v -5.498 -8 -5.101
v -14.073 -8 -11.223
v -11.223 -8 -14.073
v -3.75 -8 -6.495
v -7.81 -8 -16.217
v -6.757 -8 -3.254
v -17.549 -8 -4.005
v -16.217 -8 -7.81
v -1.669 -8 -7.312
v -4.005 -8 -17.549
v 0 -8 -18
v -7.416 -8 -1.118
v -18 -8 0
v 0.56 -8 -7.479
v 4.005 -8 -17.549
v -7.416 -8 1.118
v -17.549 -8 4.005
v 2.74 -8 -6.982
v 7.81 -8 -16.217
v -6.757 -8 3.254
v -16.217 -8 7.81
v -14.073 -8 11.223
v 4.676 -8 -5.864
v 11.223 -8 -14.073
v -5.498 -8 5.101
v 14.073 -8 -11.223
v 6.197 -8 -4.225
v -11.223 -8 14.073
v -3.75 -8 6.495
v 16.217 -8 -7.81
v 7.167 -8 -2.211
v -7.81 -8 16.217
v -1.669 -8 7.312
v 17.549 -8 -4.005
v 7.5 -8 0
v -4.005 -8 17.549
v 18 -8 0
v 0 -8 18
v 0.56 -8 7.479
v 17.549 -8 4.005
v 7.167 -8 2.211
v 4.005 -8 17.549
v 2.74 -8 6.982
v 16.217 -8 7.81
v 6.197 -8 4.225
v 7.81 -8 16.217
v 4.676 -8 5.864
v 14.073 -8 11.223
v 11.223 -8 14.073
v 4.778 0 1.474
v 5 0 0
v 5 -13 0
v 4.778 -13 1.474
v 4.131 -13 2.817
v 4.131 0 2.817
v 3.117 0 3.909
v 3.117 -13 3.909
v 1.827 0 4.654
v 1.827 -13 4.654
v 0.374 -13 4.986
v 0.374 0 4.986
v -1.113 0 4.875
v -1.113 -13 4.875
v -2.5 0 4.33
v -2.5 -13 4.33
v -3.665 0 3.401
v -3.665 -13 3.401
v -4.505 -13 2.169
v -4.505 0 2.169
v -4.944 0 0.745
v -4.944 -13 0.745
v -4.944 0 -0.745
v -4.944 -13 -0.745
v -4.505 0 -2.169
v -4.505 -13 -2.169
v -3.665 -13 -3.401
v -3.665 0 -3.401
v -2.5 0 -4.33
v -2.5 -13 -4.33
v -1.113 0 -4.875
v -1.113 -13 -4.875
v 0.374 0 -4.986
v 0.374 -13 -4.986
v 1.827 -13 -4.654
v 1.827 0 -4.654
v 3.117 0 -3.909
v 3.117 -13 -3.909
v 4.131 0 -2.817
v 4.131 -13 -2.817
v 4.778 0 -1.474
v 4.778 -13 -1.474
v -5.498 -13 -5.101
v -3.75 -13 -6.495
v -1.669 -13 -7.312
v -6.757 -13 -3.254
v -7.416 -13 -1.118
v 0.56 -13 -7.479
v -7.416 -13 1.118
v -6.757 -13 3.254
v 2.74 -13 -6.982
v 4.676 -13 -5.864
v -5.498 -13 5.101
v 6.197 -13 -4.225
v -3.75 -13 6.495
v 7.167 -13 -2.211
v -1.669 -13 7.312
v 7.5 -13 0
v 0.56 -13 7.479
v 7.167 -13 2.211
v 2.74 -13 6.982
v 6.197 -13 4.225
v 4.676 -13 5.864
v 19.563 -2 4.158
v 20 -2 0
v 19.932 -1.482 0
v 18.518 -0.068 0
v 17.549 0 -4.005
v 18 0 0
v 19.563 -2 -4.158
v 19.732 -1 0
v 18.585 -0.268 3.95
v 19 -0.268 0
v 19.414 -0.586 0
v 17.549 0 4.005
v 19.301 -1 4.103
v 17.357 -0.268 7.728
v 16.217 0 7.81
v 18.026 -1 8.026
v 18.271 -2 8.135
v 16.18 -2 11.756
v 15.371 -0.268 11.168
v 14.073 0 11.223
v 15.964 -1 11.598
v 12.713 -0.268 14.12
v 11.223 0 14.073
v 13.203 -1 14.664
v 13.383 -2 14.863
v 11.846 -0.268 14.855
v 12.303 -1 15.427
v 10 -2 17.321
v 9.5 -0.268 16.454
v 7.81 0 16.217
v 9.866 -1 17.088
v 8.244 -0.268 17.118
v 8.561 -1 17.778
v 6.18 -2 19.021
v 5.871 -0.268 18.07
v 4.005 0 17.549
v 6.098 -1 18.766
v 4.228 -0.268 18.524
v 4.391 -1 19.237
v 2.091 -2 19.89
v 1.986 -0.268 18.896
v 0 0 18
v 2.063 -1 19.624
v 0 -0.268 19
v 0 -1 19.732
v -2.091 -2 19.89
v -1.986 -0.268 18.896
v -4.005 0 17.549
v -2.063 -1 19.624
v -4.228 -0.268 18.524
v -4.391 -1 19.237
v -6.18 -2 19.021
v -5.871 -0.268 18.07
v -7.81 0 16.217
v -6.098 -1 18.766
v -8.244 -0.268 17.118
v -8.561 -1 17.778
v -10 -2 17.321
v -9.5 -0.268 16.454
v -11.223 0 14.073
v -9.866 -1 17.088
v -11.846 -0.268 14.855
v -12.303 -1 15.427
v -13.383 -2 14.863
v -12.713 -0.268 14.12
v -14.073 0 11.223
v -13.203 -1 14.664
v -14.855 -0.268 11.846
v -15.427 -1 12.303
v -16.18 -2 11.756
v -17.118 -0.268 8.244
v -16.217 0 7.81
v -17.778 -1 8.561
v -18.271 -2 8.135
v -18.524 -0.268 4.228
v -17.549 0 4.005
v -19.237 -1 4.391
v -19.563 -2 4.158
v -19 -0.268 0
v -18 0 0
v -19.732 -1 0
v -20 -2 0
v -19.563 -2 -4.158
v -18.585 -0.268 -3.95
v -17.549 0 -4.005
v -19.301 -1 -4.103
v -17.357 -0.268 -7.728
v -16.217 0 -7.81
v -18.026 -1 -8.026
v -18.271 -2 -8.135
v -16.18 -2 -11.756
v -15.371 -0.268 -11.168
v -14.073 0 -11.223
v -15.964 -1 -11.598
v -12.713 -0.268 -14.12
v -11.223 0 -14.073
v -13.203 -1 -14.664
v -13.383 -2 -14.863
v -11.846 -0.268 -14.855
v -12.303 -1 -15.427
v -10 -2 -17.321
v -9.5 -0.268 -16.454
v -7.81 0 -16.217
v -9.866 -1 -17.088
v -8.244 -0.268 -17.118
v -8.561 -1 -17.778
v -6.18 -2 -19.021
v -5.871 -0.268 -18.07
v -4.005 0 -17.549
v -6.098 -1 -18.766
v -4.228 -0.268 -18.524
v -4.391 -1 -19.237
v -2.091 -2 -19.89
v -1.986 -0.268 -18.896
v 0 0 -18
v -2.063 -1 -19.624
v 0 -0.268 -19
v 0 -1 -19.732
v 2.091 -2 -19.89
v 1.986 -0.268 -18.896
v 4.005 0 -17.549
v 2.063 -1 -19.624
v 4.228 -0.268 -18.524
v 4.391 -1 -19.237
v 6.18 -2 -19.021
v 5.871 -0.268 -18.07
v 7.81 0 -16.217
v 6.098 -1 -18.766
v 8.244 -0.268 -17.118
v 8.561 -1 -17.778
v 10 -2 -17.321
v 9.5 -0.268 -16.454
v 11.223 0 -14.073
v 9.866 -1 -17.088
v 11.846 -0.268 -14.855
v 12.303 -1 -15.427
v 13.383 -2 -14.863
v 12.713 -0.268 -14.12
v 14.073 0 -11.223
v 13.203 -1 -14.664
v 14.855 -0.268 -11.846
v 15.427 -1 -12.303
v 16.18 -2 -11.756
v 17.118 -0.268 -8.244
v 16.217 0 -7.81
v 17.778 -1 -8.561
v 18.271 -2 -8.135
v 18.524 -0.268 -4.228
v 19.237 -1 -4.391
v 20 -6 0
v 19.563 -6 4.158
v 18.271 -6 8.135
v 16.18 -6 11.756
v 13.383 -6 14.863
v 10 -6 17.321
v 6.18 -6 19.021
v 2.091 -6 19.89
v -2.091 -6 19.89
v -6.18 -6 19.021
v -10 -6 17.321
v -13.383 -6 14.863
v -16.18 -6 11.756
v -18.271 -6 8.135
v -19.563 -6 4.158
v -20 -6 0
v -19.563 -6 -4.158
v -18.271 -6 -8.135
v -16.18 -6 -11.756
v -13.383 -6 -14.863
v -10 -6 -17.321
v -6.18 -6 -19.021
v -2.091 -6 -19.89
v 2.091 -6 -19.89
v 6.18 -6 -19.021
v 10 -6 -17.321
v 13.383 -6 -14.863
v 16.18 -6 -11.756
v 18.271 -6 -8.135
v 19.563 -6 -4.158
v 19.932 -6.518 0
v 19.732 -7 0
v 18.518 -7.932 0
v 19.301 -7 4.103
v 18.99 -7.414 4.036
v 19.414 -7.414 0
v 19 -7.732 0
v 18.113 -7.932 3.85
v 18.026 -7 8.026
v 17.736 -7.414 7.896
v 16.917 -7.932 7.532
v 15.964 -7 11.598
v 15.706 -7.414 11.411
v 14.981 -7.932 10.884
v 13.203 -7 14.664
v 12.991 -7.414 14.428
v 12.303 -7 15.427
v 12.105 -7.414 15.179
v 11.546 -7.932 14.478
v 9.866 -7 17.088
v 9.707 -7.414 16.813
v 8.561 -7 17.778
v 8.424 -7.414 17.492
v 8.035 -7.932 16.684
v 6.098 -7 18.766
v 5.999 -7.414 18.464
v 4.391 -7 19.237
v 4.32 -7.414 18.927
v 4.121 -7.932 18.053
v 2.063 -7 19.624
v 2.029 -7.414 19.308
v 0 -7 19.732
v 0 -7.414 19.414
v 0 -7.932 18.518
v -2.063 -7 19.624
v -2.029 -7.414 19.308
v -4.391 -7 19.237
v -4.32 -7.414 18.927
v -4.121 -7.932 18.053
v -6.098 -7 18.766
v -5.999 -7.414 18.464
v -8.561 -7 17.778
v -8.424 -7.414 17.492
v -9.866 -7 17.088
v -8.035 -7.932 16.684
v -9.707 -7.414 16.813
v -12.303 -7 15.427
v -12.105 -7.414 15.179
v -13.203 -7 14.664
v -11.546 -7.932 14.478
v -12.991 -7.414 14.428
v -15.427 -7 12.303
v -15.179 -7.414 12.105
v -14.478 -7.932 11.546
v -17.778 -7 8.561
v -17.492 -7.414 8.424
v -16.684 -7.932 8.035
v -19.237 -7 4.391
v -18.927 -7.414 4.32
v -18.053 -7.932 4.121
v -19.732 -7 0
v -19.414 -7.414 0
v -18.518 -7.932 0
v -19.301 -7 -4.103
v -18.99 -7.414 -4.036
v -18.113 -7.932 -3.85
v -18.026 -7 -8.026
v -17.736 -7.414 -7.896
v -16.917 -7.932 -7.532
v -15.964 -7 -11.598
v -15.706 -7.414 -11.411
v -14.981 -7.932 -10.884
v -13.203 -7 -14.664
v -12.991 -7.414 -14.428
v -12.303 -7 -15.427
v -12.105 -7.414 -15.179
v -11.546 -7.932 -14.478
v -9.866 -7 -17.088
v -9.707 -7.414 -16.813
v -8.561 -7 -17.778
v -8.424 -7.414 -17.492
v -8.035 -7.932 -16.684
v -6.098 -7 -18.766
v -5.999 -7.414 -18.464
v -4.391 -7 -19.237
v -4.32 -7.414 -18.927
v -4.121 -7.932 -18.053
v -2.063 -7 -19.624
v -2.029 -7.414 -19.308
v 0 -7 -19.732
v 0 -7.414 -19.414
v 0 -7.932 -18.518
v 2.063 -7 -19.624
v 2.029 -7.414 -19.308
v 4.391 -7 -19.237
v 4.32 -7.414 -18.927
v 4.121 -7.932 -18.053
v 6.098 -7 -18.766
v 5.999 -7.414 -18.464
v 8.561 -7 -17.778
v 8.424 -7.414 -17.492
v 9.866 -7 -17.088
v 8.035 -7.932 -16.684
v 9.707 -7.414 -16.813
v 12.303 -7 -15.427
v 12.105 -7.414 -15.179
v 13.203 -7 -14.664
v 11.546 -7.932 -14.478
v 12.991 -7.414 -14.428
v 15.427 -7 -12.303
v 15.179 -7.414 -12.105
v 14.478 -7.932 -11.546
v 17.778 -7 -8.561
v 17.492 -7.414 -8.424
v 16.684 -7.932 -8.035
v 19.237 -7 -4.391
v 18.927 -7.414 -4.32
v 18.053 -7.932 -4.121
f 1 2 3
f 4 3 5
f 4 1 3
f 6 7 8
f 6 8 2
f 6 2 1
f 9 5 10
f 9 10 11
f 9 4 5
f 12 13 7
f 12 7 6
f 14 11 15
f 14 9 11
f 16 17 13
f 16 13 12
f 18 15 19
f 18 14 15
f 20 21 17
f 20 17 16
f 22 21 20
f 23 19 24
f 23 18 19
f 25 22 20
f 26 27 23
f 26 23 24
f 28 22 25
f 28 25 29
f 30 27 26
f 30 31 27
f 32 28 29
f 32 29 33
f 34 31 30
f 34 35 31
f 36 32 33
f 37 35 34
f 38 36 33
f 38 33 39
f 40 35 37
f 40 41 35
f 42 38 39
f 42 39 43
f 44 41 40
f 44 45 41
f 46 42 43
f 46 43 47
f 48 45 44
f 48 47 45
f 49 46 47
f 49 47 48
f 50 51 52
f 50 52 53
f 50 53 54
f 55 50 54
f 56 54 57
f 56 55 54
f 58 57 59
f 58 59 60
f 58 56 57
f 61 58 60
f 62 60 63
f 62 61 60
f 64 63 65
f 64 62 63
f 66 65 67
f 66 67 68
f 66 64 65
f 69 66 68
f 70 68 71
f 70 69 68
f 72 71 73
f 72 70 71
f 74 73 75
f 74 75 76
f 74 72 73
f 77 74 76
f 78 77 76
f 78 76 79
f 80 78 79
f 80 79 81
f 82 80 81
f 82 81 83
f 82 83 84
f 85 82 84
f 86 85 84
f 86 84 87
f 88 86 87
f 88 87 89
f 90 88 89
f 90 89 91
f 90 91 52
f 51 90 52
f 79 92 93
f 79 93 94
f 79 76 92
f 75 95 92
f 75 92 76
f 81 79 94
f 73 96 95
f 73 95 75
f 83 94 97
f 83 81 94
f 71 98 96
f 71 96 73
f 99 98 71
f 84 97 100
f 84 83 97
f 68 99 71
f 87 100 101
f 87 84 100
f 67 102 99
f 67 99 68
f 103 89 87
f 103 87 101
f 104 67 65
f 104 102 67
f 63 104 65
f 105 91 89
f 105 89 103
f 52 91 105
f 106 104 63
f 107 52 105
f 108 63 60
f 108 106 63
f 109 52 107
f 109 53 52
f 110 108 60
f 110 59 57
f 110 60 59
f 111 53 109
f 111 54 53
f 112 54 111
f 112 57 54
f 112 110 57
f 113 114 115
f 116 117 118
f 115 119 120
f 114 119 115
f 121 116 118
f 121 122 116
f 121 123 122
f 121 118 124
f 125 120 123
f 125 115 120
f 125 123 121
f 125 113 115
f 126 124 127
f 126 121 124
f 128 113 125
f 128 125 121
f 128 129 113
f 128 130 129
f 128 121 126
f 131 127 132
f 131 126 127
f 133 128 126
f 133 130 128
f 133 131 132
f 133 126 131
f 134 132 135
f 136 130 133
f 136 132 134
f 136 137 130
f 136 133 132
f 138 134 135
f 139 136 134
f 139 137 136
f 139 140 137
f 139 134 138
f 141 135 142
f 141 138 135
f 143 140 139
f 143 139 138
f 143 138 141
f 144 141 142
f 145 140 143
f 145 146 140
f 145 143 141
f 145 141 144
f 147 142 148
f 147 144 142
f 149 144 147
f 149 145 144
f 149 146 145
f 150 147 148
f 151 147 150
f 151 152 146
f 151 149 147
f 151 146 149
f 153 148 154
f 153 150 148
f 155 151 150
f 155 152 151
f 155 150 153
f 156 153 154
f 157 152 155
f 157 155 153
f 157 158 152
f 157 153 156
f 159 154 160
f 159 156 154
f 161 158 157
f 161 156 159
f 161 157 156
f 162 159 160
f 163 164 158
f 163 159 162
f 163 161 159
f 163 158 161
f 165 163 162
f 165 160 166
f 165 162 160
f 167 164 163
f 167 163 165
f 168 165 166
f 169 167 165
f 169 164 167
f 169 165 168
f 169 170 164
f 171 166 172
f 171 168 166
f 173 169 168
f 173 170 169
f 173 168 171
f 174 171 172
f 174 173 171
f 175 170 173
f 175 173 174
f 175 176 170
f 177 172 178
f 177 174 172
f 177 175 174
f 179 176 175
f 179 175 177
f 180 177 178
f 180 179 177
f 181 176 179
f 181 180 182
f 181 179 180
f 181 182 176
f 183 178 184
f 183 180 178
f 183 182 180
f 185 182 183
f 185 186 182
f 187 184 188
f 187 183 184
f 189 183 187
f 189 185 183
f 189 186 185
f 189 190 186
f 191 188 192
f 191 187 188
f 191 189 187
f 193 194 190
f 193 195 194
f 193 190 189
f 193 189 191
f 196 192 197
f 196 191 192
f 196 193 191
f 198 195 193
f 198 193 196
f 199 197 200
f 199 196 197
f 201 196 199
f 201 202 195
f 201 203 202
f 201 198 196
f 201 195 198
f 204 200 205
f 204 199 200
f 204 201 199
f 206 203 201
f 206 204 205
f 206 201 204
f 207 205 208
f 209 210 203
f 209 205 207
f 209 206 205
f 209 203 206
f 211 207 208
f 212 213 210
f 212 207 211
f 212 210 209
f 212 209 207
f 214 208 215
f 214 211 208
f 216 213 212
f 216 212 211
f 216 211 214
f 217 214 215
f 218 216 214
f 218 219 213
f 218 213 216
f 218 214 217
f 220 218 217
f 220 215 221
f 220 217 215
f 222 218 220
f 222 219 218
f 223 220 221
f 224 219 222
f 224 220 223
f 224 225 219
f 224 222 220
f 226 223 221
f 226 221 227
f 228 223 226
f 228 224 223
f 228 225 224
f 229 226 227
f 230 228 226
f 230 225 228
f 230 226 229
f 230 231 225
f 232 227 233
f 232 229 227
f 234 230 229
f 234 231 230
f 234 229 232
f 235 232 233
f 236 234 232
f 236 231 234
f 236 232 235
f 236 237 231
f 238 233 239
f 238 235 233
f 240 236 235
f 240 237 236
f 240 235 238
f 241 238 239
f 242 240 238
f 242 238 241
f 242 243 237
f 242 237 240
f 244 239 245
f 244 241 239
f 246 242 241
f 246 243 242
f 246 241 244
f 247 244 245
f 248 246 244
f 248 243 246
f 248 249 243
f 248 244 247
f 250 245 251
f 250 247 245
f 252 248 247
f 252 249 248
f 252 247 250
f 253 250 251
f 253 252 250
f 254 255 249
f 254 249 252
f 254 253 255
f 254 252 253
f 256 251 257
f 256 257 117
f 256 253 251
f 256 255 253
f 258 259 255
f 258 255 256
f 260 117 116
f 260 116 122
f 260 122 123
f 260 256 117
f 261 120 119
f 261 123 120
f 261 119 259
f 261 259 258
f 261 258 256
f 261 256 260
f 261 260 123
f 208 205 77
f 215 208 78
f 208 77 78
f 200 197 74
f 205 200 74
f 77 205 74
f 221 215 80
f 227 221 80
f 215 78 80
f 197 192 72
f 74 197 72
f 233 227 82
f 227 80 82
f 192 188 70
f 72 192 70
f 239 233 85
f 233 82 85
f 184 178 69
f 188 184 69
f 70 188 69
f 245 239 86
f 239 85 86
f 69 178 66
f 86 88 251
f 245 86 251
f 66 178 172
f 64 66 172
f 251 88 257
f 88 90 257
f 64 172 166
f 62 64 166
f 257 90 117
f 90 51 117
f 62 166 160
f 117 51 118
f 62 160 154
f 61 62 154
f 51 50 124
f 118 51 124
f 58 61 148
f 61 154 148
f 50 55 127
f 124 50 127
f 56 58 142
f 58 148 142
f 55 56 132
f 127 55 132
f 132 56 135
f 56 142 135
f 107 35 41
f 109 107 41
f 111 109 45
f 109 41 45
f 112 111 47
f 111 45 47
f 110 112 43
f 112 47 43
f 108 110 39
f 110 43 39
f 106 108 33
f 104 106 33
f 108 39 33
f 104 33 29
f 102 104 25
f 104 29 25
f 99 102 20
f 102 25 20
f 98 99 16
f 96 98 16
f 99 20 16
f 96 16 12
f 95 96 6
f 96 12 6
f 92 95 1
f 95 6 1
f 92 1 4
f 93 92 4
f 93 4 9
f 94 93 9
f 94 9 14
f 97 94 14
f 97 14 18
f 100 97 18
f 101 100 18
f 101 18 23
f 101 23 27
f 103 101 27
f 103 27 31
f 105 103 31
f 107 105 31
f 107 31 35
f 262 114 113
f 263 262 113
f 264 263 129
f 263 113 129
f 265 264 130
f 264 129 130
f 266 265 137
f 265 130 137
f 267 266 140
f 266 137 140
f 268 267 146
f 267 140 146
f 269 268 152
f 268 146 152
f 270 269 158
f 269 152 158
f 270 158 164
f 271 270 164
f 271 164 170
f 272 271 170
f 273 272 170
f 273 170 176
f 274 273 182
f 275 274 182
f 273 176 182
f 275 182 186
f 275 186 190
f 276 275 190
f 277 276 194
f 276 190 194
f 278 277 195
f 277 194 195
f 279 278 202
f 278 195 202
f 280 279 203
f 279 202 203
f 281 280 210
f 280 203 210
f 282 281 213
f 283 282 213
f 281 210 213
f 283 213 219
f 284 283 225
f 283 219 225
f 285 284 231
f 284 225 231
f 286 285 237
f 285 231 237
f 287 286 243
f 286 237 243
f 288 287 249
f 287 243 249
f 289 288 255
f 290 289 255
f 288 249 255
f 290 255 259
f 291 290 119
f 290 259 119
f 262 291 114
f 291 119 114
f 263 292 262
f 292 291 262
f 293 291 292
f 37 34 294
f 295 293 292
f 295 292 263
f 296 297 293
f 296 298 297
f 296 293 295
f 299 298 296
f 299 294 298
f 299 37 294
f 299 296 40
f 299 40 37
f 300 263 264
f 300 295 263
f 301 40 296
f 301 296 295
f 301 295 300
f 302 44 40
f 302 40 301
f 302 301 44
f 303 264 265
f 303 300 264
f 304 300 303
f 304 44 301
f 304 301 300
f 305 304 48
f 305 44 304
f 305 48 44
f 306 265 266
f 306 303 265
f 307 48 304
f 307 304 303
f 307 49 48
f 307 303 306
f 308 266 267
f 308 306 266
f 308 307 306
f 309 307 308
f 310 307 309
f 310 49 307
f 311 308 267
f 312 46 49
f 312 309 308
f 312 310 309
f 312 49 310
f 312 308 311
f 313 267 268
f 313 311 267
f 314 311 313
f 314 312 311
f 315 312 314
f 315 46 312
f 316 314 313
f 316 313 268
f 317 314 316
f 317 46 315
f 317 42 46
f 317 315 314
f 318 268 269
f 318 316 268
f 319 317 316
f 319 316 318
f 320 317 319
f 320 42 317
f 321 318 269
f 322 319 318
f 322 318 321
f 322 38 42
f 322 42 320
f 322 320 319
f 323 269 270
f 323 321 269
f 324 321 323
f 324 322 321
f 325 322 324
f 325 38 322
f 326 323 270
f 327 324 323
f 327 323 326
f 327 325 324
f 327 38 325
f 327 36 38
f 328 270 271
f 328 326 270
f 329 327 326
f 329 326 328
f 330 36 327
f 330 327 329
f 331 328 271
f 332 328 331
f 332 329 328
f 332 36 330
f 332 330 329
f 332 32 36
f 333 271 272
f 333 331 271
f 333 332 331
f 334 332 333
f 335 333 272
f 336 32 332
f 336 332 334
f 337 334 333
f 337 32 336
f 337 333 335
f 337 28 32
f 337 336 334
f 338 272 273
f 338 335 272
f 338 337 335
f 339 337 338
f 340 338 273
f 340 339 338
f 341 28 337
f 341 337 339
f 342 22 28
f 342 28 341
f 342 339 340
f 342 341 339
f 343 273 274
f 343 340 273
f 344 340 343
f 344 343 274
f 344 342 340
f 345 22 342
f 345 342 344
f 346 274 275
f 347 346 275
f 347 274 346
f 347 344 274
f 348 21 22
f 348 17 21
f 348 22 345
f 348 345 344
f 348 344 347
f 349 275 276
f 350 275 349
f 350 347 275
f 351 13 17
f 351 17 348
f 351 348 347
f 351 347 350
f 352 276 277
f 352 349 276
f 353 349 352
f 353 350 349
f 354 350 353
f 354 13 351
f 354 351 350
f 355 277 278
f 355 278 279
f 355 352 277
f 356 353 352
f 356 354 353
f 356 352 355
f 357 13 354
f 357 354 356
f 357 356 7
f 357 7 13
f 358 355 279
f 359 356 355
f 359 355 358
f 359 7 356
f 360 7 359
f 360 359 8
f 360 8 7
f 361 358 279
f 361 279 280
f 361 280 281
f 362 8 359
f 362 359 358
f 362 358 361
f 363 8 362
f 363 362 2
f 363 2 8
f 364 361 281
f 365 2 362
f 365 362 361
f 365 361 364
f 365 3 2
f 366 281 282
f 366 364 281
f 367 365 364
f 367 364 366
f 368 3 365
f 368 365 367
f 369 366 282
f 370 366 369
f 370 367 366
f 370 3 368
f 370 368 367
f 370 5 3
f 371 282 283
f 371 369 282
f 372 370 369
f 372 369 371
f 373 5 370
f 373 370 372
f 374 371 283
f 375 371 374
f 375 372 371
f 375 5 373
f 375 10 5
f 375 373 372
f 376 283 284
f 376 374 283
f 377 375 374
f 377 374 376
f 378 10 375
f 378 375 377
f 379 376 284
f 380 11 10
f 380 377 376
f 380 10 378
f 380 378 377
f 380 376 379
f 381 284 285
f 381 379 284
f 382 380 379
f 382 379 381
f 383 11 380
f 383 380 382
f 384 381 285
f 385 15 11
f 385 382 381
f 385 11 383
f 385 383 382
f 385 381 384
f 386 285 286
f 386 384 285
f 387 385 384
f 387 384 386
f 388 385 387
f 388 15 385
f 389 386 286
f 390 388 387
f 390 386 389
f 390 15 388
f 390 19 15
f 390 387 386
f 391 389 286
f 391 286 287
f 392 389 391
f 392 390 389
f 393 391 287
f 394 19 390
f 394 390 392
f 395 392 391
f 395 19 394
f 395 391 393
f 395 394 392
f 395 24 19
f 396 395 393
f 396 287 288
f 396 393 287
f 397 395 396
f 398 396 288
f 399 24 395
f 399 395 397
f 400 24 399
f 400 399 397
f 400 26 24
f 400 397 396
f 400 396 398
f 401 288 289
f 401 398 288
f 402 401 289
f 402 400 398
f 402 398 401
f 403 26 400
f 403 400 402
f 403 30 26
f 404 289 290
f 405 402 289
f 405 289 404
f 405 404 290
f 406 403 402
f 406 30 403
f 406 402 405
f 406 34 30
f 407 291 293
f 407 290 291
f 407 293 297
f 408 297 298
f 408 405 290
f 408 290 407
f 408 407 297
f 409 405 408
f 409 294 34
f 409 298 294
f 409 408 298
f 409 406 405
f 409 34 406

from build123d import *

# Parameters (mm, degrees)
F0_R     = 20
F0_R_2   = 7.5
F0_R_3   = 5
F1_DEPTH = 8
F2_DEPTH = 13
F3_R     = 2


with BuildPart() as f1:
    # F0 (on Front) → F1 (new body)
    with BuildSketch(Plane.XZ):
        Circle(F0_R)
        Circle(F0_R_2, mode=Mode.SUBTRACT)
        Circle(F0_R_2)
        Circle(F0_R_3, mode=Mode.SUBTRACT)
    extrude(amount=F1_DEPTH)

    # F0 (on Front) → F2 (join)
    with BuildSketch(Plane.XZ):
        Circle(F0_R_2)
        Circle(F0_R_3, mode=Mode.SUBTRACT)
    extrude(amount=F2_DEPTH)

    # F3
    f3_edges = [f1.edges().sort_by_distance(p)[0] for p in [
        (-20, 0, 0),
        (-20, -8, 0),
    ]]
    fillet(f3_edges, radius=F3_R)


solid = f1.part
